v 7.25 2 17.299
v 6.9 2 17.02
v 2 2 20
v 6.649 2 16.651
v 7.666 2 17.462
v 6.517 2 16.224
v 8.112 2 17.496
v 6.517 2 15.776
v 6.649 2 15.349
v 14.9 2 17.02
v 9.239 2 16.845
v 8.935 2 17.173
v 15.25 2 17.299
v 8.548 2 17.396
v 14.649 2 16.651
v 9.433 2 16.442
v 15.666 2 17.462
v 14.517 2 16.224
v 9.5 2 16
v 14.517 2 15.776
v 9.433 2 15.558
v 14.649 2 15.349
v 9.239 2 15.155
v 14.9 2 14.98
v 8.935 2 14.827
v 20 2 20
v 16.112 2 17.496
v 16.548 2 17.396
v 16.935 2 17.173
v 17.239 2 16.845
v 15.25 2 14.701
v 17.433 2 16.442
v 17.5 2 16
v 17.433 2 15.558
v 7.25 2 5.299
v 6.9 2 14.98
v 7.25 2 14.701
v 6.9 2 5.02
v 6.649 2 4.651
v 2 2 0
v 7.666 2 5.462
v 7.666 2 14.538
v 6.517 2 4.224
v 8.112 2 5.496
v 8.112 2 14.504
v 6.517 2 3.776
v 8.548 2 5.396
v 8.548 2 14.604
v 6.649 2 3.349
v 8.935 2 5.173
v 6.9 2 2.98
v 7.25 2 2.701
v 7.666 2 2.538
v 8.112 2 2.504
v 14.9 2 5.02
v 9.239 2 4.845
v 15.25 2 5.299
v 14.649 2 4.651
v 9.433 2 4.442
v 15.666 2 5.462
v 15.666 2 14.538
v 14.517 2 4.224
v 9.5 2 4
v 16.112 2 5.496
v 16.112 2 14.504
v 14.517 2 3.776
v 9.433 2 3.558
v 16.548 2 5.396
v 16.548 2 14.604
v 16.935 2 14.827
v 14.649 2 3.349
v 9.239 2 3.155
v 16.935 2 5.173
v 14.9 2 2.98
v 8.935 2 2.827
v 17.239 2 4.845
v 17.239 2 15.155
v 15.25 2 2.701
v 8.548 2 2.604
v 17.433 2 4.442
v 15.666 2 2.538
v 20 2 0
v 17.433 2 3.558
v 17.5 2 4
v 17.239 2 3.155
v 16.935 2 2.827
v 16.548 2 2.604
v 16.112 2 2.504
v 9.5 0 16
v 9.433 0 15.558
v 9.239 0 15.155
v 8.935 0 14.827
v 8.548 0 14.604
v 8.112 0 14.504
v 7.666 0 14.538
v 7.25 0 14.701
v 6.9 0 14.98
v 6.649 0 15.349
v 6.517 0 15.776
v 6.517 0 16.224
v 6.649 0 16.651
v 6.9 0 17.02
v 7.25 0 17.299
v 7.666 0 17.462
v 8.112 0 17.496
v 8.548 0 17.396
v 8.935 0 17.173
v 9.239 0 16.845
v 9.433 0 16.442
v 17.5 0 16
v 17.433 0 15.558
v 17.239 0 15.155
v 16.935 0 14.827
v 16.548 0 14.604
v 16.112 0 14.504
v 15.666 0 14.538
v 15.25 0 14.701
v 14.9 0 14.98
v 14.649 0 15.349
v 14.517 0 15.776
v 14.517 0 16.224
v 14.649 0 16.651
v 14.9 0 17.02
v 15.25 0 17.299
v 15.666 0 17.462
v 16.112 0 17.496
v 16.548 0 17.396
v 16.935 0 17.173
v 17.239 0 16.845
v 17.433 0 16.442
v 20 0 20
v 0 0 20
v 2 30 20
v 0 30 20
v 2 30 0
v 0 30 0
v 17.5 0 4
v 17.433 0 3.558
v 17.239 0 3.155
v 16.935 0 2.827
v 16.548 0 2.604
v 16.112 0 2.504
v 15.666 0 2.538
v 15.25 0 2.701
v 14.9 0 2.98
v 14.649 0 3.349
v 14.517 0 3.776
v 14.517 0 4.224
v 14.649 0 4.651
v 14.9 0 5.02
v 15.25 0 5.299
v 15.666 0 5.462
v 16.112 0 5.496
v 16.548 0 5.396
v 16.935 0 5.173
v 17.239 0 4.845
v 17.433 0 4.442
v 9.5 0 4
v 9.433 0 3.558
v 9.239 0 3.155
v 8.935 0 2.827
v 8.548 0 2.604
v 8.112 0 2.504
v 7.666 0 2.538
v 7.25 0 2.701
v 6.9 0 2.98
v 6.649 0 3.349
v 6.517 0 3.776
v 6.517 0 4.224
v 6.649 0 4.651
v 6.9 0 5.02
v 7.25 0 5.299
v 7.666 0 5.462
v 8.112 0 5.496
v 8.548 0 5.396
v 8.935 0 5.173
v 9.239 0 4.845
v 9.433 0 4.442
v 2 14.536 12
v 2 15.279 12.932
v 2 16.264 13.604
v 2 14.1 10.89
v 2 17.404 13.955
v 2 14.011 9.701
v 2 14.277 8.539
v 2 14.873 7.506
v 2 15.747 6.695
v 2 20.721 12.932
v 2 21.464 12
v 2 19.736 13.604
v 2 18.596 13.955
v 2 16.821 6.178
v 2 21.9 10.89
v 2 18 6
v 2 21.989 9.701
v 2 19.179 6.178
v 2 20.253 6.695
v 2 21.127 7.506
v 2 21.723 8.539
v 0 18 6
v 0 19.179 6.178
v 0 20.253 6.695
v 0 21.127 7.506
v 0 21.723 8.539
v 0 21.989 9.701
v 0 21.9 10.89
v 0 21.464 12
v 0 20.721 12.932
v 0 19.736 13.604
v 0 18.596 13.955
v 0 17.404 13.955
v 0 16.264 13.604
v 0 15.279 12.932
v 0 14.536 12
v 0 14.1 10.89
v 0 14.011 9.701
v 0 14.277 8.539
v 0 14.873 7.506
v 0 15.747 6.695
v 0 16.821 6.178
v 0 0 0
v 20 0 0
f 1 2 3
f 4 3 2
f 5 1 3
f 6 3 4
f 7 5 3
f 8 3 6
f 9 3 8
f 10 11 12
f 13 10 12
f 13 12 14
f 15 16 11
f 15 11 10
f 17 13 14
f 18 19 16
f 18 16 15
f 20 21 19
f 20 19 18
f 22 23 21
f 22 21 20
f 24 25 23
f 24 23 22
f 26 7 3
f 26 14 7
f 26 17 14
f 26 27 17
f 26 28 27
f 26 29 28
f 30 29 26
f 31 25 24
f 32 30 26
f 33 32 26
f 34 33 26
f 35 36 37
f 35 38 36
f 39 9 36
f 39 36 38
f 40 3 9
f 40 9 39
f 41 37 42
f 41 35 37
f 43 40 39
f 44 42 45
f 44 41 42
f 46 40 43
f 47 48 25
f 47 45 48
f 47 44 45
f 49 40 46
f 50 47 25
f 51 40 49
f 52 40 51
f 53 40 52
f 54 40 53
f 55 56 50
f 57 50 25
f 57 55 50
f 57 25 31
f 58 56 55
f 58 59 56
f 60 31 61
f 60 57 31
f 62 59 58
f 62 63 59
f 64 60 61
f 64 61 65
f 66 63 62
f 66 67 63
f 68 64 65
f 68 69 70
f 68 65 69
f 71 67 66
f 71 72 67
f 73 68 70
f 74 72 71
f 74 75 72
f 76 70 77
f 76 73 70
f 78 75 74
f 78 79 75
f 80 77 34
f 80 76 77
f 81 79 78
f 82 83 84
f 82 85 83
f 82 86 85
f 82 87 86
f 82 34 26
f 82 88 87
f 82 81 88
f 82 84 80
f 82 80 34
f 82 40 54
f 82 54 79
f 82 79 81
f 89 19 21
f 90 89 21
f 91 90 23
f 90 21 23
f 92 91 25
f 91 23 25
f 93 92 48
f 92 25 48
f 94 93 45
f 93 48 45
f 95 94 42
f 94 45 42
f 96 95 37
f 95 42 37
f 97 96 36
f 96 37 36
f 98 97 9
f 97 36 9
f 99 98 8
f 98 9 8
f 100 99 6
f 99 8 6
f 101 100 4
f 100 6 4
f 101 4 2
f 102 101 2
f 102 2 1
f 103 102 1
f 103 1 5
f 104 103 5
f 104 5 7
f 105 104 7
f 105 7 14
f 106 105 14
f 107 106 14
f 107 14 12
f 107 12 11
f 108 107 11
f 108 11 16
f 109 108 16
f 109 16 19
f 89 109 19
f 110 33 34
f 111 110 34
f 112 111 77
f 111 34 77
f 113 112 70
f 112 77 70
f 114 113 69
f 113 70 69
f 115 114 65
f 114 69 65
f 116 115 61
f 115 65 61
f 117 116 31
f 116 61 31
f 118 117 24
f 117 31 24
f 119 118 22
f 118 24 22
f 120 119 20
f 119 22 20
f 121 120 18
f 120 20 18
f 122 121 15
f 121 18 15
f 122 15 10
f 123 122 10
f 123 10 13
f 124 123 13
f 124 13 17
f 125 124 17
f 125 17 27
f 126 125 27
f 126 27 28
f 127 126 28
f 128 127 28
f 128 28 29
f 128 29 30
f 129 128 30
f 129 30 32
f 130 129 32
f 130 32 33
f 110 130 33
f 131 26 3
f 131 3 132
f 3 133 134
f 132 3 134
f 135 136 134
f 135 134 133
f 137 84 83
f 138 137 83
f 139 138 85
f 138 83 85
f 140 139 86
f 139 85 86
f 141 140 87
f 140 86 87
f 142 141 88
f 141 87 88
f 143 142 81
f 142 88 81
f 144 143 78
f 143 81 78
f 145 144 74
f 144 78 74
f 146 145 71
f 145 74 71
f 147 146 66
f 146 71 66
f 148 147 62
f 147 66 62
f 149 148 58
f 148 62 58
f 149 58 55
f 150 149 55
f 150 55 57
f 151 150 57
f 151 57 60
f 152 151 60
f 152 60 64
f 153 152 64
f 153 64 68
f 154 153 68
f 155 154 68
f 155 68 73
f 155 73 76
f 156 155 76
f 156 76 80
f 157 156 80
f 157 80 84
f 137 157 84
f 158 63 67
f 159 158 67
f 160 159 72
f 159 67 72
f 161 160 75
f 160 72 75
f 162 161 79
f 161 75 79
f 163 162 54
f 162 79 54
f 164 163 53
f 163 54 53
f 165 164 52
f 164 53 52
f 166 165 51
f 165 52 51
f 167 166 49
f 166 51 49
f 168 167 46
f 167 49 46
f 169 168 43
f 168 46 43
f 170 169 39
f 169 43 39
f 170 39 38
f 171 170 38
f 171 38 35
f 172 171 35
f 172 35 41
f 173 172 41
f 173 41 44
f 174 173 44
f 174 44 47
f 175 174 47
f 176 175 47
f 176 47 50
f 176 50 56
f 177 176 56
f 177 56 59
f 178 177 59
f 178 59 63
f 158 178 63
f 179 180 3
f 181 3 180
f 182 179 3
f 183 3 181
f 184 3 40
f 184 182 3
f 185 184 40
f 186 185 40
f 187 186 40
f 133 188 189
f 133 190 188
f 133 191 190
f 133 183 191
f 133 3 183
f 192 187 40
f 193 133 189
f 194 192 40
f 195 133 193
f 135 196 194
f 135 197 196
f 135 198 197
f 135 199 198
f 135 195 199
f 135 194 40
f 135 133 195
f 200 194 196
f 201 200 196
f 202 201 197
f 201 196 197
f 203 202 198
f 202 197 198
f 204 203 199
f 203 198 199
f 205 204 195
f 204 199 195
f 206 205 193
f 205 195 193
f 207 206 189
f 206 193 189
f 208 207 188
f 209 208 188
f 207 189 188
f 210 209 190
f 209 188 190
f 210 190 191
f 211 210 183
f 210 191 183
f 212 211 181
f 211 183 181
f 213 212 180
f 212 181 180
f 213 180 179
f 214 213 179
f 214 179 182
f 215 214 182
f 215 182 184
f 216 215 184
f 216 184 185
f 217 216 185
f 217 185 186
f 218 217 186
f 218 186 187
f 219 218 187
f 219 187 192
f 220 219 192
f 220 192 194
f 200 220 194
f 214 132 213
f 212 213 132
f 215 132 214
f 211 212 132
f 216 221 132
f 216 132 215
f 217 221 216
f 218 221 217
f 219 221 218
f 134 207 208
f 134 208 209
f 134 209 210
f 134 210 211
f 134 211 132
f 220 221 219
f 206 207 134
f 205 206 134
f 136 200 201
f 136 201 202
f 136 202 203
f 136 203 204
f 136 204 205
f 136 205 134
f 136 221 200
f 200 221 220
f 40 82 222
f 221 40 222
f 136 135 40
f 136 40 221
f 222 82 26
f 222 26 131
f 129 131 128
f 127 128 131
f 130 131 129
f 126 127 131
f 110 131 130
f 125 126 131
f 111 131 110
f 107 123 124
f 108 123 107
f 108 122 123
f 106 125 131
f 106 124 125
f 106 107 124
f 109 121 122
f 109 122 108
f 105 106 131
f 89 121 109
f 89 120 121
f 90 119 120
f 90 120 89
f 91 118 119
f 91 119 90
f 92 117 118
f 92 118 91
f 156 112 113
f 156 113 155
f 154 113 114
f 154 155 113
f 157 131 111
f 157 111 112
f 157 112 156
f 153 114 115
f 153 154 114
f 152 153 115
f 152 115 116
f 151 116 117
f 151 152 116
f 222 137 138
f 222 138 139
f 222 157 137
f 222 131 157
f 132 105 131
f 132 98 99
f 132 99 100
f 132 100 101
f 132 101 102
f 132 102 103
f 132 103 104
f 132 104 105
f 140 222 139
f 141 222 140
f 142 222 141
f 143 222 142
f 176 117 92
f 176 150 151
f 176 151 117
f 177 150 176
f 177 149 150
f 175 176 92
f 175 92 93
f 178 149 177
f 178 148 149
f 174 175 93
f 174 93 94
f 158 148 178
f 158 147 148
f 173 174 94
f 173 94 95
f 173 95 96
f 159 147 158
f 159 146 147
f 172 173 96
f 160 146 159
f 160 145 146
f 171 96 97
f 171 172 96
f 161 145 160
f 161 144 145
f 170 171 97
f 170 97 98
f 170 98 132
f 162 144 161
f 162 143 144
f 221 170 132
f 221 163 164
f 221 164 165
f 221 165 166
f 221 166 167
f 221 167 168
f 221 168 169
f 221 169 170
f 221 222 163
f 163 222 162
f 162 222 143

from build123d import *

# Parameters (mm, degrees)
EXTRUDE_1_DEPTH     = 20
SKETCH_2_R          = 1.5
CUT_EXTRUDE_1_DEPTH = 4
SKETCH_3_R          = 4
CUT_EXTRUDE_2_DEPTH = 4
SKETCH_4_R          = 1.5
CUT_EXTRUDE_3_DEPTH = 20
SKETCH_5_W          = 3
SKETCH_5_H          = 20
CUT_EXTRUDE_4_DEPTH = 8
SKETCH_6_W          = 20
SKETCH_6_H          = 27
CUT_EXTRUDE_5_DEPTH = 1
SKETCH_7_W          = 18
SKETCH_7_H          = 20
CUT_EXTRUDE_6_DEPTH = 1


with BuildPart() as part:
    # 草图1 → 凸台-拉伸1 (new body)
    with BuildSketch(Plane.XY):
        Polygon((0, 0), (0, 38), (3, 38), (3, 3), (20, 3), (20, 0), align=None)
    extrude(amount=EXTRUDE_1_DEPTH)

    # 草图2 → 切除-拉伸1 (cut, through all)
    with BuildSketch(Plane(origin=(0, 3, 0), x_dir=(1, 0, 0), z_dir=(0, 1, 0))):
        with Locations((16, -16)):
            Circle(SKETCH_2_R)
        with Locations((16, -4)):
            Circle(SKETCH_2_R)
    extrude(amount=-CUT_EXTRUDE_1_DEPTH, mode=Mode.SUBTRACT)

    # 草图3 → 切除-拉伸2 (cut, through all)
    with BuildSketch(Plane(origin=(3, 0, 0), x_dir=(0, 0, -1), z_dir=(1, 0, 0))):
        with Locations((-10, 18)):
            Circle(SKETCH_3_R)
    extrude(amount=-CUT_EXTRUDE_2_DEPTH, mode=Mode.SUBTRACT)

    # 草图4 → 切除-拉伸3 (cut)
    with BuildSketch(Plane(origin=(0, 3, 0), x_dir=(1, 0, 0), z_dir=(0, 1, 0))):
        with Locations((8, -16)):
            Circle(SKETCH_4_R)
        with Locations((8, -4)):
            Circle(SKETCH_4_R)
    extrude(amount=-CUT_EXTRUDE_3_DEPTH, mode=Mode.SUBTRACT)

    # 草图5 → 切除-拉伸4 (cut)
    with BuildSketch(Plane(origin=(0, 38, 0), x_dir=(1, 0, 0), z_dir=(0, 1, 0))):
        with Locations((1.5, -10)):
            Rectangle(SKETCH_5_W, SKETCH_5_H)
    extrude(amount=-CUT_EXTRUDE_4_DEPTH, mode=Mode.SUBTRACT)

    # 草图6 → 切除-拉伸5 (cut)
    with BuildSketch(Plane(origin=(3, 0, 0), x_dir=(0, 0, -1), z_dir=(1, 0, 0))):
        with Locations((-10, 16.5)):
            Rectangle(SKETCH_6_W, SKETCH_6_H)
    extrude(amount=-CUT_EXTRUDE_5_DEPTH, mode=Mode.SUBTRACT)

    # 草图7 → 切除-拉伸6 (cut)
    with BuildSketch(Plane(origin=(0, 3, 0), x_dir=(1, 0, 0), z_dir=(0, 1, 0))):
        with Locations((11, -10)):
            Rectangle(SKETCH_7_W, SKETCH_7_H)
    extrude(amount=-CUT_EXTRUDE_6_DEPTH, mode=Mode.SUBTRACT)


solid = part.part
